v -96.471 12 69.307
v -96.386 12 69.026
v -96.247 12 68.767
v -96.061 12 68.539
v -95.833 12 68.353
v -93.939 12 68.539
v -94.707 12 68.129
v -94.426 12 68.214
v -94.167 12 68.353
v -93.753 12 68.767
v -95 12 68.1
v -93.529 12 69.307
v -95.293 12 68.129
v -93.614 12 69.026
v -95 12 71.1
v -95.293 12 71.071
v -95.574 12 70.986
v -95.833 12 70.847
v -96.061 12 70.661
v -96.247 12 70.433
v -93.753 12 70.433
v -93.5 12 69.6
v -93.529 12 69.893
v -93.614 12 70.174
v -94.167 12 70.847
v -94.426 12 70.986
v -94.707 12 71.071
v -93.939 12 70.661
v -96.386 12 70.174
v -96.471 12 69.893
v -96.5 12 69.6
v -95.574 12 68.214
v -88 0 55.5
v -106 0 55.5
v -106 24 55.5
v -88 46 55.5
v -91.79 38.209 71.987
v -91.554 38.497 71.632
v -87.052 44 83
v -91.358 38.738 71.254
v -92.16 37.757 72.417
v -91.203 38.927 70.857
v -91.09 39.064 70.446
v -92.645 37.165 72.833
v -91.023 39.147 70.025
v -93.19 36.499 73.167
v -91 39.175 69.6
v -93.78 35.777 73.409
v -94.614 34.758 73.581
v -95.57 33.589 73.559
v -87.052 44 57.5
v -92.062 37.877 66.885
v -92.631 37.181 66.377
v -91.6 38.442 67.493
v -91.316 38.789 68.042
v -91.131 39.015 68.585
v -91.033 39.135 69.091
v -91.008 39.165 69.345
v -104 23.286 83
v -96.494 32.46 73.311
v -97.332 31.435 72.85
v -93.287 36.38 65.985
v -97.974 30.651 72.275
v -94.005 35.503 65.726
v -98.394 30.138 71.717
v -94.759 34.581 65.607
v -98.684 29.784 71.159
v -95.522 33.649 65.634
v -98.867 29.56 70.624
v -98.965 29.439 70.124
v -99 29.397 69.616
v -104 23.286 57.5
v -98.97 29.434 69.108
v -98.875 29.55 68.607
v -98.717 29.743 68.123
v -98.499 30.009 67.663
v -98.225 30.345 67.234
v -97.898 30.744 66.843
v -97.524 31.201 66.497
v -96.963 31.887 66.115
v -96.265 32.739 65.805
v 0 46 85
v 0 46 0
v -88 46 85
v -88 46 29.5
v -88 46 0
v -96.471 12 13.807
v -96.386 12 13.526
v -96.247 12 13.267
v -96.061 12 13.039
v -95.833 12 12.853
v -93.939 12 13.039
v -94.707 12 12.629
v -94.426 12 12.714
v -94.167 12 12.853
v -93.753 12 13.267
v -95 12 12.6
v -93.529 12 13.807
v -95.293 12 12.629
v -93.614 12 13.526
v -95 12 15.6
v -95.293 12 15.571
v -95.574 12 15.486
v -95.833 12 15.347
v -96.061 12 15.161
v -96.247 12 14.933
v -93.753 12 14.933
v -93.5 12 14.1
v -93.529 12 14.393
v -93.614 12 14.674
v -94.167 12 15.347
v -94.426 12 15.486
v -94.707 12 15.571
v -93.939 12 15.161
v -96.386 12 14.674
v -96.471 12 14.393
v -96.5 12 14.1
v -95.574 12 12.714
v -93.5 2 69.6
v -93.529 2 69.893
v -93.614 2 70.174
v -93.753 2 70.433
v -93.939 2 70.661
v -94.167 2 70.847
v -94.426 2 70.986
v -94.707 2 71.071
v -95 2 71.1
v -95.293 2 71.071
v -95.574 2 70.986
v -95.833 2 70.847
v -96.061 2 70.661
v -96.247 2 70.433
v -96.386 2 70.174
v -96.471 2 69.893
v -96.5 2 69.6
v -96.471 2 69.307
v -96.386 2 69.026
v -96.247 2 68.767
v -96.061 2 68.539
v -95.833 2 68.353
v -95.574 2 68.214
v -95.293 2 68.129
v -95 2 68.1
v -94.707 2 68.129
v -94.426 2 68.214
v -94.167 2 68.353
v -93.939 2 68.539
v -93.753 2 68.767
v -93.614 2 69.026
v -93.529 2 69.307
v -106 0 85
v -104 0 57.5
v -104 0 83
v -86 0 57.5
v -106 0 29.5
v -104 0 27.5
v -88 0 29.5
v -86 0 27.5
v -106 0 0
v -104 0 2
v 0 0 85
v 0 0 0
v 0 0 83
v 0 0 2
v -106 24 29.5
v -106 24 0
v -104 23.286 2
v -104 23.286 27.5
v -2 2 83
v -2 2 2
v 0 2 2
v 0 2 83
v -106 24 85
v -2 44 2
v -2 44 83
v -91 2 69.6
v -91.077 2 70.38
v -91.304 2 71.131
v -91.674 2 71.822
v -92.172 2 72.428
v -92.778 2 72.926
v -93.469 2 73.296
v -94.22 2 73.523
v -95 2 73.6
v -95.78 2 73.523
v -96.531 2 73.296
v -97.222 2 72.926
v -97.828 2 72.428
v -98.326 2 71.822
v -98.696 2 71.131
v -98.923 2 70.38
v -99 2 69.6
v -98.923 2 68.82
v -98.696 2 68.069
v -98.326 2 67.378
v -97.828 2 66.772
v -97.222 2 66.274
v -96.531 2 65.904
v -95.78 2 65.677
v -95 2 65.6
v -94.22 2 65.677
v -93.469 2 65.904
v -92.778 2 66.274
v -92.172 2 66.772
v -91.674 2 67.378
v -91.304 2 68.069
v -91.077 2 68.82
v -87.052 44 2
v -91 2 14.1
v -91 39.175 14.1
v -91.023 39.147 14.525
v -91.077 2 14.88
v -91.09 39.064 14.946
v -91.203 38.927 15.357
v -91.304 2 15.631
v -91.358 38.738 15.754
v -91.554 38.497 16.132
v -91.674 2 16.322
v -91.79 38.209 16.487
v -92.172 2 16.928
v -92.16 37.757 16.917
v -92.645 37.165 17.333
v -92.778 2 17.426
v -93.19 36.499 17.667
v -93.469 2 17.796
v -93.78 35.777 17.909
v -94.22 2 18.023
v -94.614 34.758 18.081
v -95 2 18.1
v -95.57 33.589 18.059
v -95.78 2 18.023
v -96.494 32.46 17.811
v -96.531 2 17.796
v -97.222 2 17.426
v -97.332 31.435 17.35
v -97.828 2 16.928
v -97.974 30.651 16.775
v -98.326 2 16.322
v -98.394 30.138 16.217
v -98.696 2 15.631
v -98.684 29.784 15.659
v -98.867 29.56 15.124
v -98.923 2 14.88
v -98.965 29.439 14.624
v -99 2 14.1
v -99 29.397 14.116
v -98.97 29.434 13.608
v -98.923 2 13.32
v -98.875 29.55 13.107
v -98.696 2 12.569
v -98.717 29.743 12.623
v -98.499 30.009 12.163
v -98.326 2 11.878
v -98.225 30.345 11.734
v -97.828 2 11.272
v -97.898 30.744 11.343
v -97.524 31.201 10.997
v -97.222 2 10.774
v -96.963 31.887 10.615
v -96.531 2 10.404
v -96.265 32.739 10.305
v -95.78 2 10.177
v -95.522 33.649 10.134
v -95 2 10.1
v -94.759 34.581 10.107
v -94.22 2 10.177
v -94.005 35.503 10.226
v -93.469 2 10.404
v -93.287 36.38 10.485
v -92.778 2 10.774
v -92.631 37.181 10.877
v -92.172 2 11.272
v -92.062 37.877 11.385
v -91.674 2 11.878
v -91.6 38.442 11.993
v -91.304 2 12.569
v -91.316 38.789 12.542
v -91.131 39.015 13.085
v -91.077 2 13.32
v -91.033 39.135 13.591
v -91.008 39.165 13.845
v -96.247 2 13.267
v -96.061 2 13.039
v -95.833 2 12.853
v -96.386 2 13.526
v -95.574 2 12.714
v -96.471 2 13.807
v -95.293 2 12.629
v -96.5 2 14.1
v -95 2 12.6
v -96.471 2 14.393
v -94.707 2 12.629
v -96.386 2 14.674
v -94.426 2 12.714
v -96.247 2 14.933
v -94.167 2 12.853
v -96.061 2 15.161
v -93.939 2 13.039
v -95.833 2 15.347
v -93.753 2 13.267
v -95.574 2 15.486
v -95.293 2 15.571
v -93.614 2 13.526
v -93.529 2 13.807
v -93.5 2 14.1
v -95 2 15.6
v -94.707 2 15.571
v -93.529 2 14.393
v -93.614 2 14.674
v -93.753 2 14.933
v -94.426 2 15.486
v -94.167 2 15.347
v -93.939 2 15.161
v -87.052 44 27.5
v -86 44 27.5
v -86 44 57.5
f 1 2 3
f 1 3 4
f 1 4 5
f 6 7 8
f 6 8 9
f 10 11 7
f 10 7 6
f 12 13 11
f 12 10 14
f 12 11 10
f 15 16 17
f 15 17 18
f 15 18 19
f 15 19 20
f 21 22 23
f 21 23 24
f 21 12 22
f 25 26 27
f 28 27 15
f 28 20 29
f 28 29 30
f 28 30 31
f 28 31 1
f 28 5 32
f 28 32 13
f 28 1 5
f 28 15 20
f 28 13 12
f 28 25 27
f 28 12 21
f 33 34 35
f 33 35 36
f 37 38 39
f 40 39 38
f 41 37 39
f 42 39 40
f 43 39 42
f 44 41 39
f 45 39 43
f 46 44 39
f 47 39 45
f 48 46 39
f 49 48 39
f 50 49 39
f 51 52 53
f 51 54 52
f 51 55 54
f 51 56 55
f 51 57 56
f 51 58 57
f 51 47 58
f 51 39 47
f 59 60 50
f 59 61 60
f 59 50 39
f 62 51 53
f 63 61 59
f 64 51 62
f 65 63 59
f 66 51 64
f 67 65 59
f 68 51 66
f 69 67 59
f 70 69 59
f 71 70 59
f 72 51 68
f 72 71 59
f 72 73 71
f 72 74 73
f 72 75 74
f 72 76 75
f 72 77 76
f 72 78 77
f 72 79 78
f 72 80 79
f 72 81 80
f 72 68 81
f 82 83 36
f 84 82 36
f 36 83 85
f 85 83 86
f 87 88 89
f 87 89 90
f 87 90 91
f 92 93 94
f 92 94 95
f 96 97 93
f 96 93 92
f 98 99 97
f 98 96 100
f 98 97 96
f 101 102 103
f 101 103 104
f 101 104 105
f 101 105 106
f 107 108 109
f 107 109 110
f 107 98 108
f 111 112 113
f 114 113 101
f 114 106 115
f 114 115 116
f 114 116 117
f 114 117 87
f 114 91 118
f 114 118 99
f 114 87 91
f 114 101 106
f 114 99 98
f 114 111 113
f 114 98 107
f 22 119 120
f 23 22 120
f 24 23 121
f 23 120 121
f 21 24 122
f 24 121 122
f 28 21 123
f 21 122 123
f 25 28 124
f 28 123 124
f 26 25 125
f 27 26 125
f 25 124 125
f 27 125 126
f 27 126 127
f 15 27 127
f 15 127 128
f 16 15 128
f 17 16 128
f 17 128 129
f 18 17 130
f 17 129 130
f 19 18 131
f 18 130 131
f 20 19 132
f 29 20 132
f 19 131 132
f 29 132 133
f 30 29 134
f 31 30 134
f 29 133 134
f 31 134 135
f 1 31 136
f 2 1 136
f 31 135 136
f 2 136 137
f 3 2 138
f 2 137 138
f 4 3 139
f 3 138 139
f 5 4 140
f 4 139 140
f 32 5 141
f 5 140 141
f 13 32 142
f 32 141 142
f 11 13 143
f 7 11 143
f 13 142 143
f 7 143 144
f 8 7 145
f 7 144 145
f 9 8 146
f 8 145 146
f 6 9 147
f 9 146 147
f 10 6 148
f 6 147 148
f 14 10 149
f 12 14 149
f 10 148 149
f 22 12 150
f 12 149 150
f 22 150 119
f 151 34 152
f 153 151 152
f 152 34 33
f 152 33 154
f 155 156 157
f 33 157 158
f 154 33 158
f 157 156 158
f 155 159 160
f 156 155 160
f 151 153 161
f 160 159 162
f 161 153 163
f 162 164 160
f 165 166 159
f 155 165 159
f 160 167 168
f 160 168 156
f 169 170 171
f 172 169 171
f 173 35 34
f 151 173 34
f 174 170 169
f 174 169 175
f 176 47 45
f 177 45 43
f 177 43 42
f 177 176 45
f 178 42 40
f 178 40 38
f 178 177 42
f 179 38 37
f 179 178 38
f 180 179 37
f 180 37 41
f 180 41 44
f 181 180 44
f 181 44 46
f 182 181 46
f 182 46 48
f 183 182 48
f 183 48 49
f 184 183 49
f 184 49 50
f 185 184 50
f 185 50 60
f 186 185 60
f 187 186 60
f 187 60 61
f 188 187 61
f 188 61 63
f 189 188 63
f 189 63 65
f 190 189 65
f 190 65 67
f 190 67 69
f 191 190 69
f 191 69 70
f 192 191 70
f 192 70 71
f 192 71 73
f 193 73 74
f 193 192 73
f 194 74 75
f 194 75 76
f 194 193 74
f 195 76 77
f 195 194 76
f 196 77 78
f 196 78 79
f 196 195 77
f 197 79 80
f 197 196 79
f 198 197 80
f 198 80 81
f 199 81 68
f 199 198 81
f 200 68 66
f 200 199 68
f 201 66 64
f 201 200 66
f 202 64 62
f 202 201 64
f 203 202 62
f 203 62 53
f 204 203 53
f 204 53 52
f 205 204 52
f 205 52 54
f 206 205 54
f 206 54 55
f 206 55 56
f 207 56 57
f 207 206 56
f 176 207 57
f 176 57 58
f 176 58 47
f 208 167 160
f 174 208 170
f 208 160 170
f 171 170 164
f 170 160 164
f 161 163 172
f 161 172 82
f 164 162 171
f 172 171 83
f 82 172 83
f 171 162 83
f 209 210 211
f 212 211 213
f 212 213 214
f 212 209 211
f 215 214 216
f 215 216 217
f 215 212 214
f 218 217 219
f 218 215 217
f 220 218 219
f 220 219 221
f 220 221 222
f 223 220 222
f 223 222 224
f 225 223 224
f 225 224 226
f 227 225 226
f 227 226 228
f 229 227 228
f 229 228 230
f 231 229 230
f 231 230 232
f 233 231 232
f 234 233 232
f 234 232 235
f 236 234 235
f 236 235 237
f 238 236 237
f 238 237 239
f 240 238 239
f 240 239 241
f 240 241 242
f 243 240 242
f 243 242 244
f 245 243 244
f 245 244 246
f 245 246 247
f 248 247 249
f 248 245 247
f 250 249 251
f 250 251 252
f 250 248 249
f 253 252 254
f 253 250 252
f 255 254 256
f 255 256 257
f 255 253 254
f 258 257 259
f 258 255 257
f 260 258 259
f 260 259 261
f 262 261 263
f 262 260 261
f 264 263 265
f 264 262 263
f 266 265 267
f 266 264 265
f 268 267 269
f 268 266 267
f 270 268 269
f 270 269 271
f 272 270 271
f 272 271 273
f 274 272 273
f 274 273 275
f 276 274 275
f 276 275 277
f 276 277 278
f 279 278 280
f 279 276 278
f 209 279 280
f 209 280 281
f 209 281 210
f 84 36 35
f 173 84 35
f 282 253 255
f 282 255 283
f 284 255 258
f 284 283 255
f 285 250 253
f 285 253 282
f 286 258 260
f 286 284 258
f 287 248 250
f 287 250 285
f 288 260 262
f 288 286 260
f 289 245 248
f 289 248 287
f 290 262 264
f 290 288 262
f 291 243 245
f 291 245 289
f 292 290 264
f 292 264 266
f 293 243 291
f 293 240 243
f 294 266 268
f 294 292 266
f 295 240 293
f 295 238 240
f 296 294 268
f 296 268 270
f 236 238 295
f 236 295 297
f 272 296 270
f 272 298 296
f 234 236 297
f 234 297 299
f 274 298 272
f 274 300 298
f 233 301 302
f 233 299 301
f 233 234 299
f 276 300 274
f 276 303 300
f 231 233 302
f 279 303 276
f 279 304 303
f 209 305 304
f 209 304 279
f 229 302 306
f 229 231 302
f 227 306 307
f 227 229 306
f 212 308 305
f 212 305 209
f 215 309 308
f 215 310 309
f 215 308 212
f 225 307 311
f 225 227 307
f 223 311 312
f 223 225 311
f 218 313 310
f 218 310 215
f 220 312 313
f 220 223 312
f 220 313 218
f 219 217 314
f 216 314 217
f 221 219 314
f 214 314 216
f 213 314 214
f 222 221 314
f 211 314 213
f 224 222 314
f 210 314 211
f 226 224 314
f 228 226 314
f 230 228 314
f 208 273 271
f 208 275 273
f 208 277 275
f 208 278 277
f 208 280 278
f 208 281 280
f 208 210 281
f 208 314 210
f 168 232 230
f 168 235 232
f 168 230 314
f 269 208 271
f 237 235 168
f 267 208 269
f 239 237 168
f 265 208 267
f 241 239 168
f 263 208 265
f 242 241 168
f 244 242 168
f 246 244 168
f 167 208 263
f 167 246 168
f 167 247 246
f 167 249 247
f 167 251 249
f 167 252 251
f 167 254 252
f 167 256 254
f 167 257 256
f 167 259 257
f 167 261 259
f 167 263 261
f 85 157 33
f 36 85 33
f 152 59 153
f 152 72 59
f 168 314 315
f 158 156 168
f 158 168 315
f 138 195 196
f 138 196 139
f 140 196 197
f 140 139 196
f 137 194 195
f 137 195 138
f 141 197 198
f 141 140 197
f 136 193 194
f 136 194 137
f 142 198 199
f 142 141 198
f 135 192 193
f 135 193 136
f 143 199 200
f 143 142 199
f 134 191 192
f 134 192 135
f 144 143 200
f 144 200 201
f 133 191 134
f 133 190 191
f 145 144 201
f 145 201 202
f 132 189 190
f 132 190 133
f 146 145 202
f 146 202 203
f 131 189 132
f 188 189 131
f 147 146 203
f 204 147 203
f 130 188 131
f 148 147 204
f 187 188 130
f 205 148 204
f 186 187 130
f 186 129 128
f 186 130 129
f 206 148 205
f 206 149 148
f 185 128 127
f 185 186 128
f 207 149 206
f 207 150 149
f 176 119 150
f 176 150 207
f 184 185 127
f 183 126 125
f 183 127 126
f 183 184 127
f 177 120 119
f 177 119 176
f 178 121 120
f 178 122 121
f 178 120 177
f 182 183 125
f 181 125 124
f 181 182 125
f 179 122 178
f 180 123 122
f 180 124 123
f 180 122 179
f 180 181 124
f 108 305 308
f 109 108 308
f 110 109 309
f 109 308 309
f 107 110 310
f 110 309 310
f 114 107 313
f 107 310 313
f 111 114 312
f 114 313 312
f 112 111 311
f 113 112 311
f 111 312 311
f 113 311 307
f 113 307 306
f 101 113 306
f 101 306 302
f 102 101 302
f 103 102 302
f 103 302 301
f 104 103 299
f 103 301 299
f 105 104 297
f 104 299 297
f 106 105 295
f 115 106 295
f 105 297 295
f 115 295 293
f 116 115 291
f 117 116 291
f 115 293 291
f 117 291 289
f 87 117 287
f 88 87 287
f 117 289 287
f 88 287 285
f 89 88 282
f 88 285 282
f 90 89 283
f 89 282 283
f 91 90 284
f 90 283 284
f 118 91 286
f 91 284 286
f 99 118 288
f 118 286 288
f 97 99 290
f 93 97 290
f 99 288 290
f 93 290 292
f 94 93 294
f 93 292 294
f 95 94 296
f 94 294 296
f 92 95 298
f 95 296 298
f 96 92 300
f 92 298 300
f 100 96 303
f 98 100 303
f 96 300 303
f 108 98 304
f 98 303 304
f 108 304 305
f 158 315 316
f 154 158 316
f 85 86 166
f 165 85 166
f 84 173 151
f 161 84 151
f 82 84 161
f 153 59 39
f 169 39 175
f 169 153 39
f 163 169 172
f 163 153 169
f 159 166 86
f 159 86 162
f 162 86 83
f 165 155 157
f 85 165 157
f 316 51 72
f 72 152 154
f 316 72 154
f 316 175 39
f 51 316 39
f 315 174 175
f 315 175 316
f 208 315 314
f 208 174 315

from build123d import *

# Parameters (mm, degrees)
SALIENTE_EXTRUIR1_DEPTH = 85
CROQUIS3_W              = 18
CROQUIS3_H              = 26
CORTAR_EXTRUIR1_DEPTH   = 47
VACIADO1_T              = -2
SALIENTE_EXTRUIR2_REACH = 48
CROQUIS4_R              = 4
CROQUIS5_R              = 4
CORTAR_EXTRUIR2_DEPTH   = 2
CROQUIS8_W              = 2
CROQUIS8_H              = 81
CORTAR_EXTRUIR3_DEPTH   = 2
CROQUIS9_R              = 1.5
CORTAR_EXTRUIR4_DEPTH   = 10


with BuildPart() as part:
    # Croquis2 → Saliente-Extruir1 (new body)
    with BuildSketch(Plane.XY):
        Polygon((0, 0), (0, 46), (-88, 46), (-106, 24), (-106, 0), align=None)
    extrude(amount=SALIENTE_EXTRUIR1_DEPTH)

    # Croquis3 → Cortar-Extruir1 (cut, through all)
    with BuildSketch(Plane.XZ):
        with Locations((-97, 42.5)):
            Rectangle(CROQUIS3_W, CROQUIS3_H)
    extrude(amount=-CORTAR_EXTRUIR1_DEPTH, mode=Mode.SUBTRACT)

    # Vaciado1
    vaciado1_openings = [part.faces().sort_by_distance(p)[0] for p in [
        (-75, 0, 42.5),
    ]]
    offset(amount=VACIADO1_T, openings=vaciado1_openings, kind=Kind.INTERSECTION)

    # Croquis4 → Saliente-Extruir2 (add, up to next)
    with BuildSketch(Plane.XZ, mode=Mode.PRIVATE) as saliente_extruir2_sk1:
        with Locations((-95, 69.6)):
            Circle(CROQUIS4_R)
    saliente_extruir2_tool1 = extrude(saliente_extruir2_sk1.sketch, amount=-SALIENTE_EXTRUIR2_REACH, mode=Mode.PRIVATE) - part.part
    add(saliente_extruir2_tool1.solids().sort_by_distance((-95, 0, 69.6))[0])
    # Croquis4 → Saliente-Extruir2 (add, up to next)
    with BuildSketch(Plane.XZ, mode=Mode.PRIVATE) as saliente_extruir2_sk2:
        with Locations((-95, 14.1)):
            Circle(CROQUIS4_R)
    saliente_extruir2_tool2 = extrude(saliente_extruir2_sk2.sketch, amount=-SALIENTE_EXTRUIR2_REACH, mode=Mode.PRIVATE) - part.part
    add(saliente_extruir2_tool2.solids().sort_by_distance((-95, 0, 14.1))[0])

    # Croquis5 → Cortar-Extruir2 (cut)
    with BuildSketch(Plane.XZ):
        with Locations((-95, 69.6)):
            Circle(CROQUIS5_R)
        with Locations((-95, 14.1)):
            Circle(CROQUIS5_R)
    extrude(amount=-CORTAR_EXTRUIR2_DEPTH, mode=Mode.SUBTRACT)

    # Croquis8 → Cortar-Extruir3 (cut)
    with BuildSketch(Plane.XZ):
        with Locations((-1, 42.5)):
            Rectangle(CROQUIS8_W, CROQUIS8_H)
    extrude(amount=-CORTAR_EXTRUIR3_DEPTH, mode=Mode.SUBTRACT)

    # Croquis9 → Cortar-Extruir4 (cut)
    with BuildSketch(Plane.XZ.offset(-2)):
        with Locations((-95, 69.6)):
            Circle(CROQUIS9_R)
        with Locations((-95, 14.1)):
            Circle(CROQUIS9_R)
    extrude(amount=-CORTAR_EXTRUIR4_DEPTH, mode=Mode.SUBTRACT)


solid = part.part
